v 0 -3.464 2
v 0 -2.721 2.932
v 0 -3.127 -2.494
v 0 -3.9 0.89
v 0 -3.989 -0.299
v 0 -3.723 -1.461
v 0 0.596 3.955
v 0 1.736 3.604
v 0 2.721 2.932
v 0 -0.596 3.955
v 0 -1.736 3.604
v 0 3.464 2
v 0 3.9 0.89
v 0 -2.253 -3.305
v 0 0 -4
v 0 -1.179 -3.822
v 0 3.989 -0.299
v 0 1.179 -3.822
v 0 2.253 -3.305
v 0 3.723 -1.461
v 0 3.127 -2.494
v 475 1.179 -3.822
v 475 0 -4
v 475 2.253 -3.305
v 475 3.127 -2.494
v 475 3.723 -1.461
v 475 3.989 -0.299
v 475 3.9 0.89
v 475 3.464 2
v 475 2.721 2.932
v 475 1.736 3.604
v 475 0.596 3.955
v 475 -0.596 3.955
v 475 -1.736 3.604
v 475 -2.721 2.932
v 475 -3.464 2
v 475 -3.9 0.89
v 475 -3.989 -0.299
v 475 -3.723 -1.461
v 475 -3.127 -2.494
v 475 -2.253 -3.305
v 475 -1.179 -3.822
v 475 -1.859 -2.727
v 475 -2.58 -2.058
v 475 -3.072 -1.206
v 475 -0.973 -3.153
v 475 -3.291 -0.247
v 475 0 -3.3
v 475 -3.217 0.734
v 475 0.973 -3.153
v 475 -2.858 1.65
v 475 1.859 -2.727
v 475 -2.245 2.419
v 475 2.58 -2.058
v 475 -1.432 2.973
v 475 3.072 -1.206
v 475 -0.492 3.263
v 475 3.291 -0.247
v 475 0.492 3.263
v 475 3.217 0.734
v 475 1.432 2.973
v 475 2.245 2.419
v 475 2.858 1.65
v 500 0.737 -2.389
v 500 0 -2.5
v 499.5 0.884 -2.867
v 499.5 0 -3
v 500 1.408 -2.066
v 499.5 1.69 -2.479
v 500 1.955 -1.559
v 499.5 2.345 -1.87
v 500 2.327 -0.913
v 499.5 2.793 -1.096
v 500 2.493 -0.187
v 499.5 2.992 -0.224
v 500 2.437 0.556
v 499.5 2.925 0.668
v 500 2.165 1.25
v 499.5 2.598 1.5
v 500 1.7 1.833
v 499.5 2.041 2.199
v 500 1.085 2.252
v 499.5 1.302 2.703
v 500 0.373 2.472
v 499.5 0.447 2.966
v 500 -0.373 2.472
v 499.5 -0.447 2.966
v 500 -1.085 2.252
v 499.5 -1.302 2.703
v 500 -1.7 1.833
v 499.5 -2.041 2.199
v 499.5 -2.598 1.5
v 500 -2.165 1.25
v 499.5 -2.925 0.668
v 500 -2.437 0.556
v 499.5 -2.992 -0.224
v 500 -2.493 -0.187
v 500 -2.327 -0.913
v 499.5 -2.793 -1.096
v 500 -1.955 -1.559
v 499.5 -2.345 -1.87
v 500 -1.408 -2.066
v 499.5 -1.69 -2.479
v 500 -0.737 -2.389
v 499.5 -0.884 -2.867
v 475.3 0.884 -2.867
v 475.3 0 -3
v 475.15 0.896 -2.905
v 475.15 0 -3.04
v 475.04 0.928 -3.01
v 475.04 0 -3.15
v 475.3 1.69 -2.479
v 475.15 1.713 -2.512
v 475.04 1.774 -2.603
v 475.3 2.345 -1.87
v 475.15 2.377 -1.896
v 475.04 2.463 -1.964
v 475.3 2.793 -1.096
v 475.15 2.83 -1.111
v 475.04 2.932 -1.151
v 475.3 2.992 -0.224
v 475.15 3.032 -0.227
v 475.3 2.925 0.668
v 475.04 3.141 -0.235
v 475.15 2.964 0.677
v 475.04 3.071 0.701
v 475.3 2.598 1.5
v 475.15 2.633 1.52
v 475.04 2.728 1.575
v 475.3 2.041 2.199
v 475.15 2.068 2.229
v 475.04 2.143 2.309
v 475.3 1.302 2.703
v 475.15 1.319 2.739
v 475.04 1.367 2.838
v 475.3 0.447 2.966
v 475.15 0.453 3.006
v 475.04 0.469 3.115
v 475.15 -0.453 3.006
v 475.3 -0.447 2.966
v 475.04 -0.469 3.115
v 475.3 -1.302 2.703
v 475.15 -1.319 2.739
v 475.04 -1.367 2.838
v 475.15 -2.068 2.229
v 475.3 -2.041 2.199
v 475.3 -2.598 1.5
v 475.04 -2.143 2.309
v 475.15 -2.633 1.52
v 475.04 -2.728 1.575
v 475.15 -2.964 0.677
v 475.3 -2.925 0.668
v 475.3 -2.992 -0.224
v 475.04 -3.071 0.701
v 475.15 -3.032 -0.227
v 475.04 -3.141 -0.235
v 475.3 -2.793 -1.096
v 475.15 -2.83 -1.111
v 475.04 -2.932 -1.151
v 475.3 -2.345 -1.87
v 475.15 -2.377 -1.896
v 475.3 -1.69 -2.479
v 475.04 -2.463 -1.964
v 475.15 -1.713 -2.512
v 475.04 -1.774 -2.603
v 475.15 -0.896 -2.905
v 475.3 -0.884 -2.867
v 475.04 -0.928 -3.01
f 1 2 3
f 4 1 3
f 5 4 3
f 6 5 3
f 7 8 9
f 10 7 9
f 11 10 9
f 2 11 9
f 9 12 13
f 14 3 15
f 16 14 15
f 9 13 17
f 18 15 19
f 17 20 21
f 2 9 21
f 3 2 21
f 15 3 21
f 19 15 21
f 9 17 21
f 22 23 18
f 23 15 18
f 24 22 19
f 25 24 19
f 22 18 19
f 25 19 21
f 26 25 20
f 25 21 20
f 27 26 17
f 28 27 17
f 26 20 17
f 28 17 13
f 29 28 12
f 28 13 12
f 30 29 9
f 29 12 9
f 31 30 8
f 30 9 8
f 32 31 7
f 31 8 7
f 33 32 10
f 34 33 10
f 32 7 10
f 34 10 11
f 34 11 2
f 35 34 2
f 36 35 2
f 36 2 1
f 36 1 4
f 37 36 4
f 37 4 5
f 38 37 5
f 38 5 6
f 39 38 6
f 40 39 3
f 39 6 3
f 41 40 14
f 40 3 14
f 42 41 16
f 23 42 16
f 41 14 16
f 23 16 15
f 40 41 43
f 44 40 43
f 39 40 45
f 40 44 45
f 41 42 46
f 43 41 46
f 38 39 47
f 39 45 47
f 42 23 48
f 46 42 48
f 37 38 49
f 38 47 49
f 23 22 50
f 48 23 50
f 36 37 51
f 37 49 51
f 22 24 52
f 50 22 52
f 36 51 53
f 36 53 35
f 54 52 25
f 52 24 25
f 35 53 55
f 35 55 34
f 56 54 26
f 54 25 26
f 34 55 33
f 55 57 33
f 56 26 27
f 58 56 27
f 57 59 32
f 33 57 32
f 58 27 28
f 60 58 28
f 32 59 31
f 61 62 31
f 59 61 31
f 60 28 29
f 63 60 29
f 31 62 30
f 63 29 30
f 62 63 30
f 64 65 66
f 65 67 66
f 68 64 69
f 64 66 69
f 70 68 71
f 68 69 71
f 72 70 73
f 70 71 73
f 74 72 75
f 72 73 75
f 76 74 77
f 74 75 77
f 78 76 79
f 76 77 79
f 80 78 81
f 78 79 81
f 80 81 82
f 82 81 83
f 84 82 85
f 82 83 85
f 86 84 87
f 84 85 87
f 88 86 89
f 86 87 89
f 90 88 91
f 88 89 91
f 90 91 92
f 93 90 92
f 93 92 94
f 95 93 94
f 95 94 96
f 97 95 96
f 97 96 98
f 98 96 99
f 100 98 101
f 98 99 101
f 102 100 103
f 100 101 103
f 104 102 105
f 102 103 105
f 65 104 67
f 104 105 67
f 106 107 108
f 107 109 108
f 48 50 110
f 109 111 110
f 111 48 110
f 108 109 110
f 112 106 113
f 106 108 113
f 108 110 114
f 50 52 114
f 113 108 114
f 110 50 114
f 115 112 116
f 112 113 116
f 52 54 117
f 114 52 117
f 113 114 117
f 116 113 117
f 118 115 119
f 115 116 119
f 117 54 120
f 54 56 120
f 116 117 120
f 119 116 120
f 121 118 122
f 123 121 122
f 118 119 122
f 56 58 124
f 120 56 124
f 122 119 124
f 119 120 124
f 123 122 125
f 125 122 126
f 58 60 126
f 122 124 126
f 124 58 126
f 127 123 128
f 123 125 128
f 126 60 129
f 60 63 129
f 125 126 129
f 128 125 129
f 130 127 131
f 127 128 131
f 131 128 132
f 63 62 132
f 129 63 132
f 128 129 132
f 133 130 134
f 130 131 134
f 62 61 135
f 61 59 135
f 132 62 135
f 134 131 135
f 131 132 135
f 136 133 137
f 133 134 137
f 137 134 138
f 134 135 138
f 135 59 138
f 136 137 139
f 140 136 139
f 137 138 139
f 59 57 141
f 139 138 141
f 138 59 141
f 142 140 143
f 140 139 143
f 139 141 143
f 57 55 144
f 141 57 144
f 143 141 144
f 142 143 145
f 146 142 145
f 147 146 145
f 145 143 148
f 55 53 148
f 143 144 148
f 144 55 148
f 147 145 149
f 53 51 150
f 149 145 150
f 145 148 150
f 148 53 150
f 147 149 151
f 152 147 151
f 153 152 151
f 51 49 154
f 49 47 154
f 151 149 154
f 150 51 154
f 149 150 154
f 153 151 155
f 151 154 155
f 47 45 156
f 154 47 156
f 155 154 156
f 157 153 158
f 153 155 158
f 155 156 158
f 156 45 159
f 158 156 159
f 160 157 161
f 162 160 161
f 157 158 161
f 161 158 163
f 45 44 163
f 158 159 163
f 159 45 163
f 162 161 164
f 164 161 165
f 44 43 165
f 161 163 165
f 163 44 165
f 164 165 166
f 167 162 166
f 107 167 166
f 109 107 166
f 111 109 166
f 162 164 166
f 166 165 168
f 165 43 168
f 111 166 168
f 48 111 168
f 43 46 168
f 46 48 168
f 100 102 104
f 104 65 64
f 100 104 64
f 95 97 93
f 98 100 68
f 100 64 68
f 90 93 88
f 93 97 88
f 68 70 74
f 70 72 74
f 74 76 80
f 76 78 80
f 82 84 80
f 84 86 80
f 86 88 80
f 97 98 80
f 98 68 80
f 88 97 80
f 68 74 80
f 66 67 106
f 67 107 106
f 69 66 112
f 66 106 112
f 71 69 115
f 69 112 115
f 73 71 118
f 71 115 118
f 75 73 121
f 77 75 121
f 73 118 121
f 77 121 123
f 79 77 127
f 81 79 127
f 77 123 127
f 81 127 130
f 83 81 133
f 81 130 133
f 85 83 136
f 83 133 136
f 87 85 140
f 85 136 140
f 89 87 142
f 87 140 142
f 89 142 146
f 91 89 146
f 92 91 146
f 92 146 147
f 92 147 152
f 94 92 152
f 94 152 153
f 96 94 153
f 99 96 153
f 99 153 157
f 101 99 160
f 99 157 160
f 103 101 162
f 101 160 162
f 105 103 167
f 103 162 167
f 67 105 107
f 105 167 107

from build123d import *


with BuildPart() as part:
    # Sketch1 → Revolve1 (revolve)
    with BuildSketch(Plane.XY, mode=Mode.PRIVATE) as revolve1_sk:
        with BuildLine():
            Line((0, 4), (0, 0))
            Line((0, 0), (500, 0))
            Line((500, 0), (500, 2.5))
            Line((500, 2.5), (499.5, 3))
            Line((499.5, 3), (475.3, 3))
            ThreePointArc((475.3, 3), (475.087867966, 3.087867966), (475, 3.3))
            Line((475, 3.3), (475, 4))
            Line((475, 4), (0, 4))
        make_face()
    revolve(revolve1_sk.sketch.rotate(Axis((0, 0, 0), (1, 0, 0)), 270), axis=Axis((0, 0, 0), (1, 0, 0)))


solid = part.part
